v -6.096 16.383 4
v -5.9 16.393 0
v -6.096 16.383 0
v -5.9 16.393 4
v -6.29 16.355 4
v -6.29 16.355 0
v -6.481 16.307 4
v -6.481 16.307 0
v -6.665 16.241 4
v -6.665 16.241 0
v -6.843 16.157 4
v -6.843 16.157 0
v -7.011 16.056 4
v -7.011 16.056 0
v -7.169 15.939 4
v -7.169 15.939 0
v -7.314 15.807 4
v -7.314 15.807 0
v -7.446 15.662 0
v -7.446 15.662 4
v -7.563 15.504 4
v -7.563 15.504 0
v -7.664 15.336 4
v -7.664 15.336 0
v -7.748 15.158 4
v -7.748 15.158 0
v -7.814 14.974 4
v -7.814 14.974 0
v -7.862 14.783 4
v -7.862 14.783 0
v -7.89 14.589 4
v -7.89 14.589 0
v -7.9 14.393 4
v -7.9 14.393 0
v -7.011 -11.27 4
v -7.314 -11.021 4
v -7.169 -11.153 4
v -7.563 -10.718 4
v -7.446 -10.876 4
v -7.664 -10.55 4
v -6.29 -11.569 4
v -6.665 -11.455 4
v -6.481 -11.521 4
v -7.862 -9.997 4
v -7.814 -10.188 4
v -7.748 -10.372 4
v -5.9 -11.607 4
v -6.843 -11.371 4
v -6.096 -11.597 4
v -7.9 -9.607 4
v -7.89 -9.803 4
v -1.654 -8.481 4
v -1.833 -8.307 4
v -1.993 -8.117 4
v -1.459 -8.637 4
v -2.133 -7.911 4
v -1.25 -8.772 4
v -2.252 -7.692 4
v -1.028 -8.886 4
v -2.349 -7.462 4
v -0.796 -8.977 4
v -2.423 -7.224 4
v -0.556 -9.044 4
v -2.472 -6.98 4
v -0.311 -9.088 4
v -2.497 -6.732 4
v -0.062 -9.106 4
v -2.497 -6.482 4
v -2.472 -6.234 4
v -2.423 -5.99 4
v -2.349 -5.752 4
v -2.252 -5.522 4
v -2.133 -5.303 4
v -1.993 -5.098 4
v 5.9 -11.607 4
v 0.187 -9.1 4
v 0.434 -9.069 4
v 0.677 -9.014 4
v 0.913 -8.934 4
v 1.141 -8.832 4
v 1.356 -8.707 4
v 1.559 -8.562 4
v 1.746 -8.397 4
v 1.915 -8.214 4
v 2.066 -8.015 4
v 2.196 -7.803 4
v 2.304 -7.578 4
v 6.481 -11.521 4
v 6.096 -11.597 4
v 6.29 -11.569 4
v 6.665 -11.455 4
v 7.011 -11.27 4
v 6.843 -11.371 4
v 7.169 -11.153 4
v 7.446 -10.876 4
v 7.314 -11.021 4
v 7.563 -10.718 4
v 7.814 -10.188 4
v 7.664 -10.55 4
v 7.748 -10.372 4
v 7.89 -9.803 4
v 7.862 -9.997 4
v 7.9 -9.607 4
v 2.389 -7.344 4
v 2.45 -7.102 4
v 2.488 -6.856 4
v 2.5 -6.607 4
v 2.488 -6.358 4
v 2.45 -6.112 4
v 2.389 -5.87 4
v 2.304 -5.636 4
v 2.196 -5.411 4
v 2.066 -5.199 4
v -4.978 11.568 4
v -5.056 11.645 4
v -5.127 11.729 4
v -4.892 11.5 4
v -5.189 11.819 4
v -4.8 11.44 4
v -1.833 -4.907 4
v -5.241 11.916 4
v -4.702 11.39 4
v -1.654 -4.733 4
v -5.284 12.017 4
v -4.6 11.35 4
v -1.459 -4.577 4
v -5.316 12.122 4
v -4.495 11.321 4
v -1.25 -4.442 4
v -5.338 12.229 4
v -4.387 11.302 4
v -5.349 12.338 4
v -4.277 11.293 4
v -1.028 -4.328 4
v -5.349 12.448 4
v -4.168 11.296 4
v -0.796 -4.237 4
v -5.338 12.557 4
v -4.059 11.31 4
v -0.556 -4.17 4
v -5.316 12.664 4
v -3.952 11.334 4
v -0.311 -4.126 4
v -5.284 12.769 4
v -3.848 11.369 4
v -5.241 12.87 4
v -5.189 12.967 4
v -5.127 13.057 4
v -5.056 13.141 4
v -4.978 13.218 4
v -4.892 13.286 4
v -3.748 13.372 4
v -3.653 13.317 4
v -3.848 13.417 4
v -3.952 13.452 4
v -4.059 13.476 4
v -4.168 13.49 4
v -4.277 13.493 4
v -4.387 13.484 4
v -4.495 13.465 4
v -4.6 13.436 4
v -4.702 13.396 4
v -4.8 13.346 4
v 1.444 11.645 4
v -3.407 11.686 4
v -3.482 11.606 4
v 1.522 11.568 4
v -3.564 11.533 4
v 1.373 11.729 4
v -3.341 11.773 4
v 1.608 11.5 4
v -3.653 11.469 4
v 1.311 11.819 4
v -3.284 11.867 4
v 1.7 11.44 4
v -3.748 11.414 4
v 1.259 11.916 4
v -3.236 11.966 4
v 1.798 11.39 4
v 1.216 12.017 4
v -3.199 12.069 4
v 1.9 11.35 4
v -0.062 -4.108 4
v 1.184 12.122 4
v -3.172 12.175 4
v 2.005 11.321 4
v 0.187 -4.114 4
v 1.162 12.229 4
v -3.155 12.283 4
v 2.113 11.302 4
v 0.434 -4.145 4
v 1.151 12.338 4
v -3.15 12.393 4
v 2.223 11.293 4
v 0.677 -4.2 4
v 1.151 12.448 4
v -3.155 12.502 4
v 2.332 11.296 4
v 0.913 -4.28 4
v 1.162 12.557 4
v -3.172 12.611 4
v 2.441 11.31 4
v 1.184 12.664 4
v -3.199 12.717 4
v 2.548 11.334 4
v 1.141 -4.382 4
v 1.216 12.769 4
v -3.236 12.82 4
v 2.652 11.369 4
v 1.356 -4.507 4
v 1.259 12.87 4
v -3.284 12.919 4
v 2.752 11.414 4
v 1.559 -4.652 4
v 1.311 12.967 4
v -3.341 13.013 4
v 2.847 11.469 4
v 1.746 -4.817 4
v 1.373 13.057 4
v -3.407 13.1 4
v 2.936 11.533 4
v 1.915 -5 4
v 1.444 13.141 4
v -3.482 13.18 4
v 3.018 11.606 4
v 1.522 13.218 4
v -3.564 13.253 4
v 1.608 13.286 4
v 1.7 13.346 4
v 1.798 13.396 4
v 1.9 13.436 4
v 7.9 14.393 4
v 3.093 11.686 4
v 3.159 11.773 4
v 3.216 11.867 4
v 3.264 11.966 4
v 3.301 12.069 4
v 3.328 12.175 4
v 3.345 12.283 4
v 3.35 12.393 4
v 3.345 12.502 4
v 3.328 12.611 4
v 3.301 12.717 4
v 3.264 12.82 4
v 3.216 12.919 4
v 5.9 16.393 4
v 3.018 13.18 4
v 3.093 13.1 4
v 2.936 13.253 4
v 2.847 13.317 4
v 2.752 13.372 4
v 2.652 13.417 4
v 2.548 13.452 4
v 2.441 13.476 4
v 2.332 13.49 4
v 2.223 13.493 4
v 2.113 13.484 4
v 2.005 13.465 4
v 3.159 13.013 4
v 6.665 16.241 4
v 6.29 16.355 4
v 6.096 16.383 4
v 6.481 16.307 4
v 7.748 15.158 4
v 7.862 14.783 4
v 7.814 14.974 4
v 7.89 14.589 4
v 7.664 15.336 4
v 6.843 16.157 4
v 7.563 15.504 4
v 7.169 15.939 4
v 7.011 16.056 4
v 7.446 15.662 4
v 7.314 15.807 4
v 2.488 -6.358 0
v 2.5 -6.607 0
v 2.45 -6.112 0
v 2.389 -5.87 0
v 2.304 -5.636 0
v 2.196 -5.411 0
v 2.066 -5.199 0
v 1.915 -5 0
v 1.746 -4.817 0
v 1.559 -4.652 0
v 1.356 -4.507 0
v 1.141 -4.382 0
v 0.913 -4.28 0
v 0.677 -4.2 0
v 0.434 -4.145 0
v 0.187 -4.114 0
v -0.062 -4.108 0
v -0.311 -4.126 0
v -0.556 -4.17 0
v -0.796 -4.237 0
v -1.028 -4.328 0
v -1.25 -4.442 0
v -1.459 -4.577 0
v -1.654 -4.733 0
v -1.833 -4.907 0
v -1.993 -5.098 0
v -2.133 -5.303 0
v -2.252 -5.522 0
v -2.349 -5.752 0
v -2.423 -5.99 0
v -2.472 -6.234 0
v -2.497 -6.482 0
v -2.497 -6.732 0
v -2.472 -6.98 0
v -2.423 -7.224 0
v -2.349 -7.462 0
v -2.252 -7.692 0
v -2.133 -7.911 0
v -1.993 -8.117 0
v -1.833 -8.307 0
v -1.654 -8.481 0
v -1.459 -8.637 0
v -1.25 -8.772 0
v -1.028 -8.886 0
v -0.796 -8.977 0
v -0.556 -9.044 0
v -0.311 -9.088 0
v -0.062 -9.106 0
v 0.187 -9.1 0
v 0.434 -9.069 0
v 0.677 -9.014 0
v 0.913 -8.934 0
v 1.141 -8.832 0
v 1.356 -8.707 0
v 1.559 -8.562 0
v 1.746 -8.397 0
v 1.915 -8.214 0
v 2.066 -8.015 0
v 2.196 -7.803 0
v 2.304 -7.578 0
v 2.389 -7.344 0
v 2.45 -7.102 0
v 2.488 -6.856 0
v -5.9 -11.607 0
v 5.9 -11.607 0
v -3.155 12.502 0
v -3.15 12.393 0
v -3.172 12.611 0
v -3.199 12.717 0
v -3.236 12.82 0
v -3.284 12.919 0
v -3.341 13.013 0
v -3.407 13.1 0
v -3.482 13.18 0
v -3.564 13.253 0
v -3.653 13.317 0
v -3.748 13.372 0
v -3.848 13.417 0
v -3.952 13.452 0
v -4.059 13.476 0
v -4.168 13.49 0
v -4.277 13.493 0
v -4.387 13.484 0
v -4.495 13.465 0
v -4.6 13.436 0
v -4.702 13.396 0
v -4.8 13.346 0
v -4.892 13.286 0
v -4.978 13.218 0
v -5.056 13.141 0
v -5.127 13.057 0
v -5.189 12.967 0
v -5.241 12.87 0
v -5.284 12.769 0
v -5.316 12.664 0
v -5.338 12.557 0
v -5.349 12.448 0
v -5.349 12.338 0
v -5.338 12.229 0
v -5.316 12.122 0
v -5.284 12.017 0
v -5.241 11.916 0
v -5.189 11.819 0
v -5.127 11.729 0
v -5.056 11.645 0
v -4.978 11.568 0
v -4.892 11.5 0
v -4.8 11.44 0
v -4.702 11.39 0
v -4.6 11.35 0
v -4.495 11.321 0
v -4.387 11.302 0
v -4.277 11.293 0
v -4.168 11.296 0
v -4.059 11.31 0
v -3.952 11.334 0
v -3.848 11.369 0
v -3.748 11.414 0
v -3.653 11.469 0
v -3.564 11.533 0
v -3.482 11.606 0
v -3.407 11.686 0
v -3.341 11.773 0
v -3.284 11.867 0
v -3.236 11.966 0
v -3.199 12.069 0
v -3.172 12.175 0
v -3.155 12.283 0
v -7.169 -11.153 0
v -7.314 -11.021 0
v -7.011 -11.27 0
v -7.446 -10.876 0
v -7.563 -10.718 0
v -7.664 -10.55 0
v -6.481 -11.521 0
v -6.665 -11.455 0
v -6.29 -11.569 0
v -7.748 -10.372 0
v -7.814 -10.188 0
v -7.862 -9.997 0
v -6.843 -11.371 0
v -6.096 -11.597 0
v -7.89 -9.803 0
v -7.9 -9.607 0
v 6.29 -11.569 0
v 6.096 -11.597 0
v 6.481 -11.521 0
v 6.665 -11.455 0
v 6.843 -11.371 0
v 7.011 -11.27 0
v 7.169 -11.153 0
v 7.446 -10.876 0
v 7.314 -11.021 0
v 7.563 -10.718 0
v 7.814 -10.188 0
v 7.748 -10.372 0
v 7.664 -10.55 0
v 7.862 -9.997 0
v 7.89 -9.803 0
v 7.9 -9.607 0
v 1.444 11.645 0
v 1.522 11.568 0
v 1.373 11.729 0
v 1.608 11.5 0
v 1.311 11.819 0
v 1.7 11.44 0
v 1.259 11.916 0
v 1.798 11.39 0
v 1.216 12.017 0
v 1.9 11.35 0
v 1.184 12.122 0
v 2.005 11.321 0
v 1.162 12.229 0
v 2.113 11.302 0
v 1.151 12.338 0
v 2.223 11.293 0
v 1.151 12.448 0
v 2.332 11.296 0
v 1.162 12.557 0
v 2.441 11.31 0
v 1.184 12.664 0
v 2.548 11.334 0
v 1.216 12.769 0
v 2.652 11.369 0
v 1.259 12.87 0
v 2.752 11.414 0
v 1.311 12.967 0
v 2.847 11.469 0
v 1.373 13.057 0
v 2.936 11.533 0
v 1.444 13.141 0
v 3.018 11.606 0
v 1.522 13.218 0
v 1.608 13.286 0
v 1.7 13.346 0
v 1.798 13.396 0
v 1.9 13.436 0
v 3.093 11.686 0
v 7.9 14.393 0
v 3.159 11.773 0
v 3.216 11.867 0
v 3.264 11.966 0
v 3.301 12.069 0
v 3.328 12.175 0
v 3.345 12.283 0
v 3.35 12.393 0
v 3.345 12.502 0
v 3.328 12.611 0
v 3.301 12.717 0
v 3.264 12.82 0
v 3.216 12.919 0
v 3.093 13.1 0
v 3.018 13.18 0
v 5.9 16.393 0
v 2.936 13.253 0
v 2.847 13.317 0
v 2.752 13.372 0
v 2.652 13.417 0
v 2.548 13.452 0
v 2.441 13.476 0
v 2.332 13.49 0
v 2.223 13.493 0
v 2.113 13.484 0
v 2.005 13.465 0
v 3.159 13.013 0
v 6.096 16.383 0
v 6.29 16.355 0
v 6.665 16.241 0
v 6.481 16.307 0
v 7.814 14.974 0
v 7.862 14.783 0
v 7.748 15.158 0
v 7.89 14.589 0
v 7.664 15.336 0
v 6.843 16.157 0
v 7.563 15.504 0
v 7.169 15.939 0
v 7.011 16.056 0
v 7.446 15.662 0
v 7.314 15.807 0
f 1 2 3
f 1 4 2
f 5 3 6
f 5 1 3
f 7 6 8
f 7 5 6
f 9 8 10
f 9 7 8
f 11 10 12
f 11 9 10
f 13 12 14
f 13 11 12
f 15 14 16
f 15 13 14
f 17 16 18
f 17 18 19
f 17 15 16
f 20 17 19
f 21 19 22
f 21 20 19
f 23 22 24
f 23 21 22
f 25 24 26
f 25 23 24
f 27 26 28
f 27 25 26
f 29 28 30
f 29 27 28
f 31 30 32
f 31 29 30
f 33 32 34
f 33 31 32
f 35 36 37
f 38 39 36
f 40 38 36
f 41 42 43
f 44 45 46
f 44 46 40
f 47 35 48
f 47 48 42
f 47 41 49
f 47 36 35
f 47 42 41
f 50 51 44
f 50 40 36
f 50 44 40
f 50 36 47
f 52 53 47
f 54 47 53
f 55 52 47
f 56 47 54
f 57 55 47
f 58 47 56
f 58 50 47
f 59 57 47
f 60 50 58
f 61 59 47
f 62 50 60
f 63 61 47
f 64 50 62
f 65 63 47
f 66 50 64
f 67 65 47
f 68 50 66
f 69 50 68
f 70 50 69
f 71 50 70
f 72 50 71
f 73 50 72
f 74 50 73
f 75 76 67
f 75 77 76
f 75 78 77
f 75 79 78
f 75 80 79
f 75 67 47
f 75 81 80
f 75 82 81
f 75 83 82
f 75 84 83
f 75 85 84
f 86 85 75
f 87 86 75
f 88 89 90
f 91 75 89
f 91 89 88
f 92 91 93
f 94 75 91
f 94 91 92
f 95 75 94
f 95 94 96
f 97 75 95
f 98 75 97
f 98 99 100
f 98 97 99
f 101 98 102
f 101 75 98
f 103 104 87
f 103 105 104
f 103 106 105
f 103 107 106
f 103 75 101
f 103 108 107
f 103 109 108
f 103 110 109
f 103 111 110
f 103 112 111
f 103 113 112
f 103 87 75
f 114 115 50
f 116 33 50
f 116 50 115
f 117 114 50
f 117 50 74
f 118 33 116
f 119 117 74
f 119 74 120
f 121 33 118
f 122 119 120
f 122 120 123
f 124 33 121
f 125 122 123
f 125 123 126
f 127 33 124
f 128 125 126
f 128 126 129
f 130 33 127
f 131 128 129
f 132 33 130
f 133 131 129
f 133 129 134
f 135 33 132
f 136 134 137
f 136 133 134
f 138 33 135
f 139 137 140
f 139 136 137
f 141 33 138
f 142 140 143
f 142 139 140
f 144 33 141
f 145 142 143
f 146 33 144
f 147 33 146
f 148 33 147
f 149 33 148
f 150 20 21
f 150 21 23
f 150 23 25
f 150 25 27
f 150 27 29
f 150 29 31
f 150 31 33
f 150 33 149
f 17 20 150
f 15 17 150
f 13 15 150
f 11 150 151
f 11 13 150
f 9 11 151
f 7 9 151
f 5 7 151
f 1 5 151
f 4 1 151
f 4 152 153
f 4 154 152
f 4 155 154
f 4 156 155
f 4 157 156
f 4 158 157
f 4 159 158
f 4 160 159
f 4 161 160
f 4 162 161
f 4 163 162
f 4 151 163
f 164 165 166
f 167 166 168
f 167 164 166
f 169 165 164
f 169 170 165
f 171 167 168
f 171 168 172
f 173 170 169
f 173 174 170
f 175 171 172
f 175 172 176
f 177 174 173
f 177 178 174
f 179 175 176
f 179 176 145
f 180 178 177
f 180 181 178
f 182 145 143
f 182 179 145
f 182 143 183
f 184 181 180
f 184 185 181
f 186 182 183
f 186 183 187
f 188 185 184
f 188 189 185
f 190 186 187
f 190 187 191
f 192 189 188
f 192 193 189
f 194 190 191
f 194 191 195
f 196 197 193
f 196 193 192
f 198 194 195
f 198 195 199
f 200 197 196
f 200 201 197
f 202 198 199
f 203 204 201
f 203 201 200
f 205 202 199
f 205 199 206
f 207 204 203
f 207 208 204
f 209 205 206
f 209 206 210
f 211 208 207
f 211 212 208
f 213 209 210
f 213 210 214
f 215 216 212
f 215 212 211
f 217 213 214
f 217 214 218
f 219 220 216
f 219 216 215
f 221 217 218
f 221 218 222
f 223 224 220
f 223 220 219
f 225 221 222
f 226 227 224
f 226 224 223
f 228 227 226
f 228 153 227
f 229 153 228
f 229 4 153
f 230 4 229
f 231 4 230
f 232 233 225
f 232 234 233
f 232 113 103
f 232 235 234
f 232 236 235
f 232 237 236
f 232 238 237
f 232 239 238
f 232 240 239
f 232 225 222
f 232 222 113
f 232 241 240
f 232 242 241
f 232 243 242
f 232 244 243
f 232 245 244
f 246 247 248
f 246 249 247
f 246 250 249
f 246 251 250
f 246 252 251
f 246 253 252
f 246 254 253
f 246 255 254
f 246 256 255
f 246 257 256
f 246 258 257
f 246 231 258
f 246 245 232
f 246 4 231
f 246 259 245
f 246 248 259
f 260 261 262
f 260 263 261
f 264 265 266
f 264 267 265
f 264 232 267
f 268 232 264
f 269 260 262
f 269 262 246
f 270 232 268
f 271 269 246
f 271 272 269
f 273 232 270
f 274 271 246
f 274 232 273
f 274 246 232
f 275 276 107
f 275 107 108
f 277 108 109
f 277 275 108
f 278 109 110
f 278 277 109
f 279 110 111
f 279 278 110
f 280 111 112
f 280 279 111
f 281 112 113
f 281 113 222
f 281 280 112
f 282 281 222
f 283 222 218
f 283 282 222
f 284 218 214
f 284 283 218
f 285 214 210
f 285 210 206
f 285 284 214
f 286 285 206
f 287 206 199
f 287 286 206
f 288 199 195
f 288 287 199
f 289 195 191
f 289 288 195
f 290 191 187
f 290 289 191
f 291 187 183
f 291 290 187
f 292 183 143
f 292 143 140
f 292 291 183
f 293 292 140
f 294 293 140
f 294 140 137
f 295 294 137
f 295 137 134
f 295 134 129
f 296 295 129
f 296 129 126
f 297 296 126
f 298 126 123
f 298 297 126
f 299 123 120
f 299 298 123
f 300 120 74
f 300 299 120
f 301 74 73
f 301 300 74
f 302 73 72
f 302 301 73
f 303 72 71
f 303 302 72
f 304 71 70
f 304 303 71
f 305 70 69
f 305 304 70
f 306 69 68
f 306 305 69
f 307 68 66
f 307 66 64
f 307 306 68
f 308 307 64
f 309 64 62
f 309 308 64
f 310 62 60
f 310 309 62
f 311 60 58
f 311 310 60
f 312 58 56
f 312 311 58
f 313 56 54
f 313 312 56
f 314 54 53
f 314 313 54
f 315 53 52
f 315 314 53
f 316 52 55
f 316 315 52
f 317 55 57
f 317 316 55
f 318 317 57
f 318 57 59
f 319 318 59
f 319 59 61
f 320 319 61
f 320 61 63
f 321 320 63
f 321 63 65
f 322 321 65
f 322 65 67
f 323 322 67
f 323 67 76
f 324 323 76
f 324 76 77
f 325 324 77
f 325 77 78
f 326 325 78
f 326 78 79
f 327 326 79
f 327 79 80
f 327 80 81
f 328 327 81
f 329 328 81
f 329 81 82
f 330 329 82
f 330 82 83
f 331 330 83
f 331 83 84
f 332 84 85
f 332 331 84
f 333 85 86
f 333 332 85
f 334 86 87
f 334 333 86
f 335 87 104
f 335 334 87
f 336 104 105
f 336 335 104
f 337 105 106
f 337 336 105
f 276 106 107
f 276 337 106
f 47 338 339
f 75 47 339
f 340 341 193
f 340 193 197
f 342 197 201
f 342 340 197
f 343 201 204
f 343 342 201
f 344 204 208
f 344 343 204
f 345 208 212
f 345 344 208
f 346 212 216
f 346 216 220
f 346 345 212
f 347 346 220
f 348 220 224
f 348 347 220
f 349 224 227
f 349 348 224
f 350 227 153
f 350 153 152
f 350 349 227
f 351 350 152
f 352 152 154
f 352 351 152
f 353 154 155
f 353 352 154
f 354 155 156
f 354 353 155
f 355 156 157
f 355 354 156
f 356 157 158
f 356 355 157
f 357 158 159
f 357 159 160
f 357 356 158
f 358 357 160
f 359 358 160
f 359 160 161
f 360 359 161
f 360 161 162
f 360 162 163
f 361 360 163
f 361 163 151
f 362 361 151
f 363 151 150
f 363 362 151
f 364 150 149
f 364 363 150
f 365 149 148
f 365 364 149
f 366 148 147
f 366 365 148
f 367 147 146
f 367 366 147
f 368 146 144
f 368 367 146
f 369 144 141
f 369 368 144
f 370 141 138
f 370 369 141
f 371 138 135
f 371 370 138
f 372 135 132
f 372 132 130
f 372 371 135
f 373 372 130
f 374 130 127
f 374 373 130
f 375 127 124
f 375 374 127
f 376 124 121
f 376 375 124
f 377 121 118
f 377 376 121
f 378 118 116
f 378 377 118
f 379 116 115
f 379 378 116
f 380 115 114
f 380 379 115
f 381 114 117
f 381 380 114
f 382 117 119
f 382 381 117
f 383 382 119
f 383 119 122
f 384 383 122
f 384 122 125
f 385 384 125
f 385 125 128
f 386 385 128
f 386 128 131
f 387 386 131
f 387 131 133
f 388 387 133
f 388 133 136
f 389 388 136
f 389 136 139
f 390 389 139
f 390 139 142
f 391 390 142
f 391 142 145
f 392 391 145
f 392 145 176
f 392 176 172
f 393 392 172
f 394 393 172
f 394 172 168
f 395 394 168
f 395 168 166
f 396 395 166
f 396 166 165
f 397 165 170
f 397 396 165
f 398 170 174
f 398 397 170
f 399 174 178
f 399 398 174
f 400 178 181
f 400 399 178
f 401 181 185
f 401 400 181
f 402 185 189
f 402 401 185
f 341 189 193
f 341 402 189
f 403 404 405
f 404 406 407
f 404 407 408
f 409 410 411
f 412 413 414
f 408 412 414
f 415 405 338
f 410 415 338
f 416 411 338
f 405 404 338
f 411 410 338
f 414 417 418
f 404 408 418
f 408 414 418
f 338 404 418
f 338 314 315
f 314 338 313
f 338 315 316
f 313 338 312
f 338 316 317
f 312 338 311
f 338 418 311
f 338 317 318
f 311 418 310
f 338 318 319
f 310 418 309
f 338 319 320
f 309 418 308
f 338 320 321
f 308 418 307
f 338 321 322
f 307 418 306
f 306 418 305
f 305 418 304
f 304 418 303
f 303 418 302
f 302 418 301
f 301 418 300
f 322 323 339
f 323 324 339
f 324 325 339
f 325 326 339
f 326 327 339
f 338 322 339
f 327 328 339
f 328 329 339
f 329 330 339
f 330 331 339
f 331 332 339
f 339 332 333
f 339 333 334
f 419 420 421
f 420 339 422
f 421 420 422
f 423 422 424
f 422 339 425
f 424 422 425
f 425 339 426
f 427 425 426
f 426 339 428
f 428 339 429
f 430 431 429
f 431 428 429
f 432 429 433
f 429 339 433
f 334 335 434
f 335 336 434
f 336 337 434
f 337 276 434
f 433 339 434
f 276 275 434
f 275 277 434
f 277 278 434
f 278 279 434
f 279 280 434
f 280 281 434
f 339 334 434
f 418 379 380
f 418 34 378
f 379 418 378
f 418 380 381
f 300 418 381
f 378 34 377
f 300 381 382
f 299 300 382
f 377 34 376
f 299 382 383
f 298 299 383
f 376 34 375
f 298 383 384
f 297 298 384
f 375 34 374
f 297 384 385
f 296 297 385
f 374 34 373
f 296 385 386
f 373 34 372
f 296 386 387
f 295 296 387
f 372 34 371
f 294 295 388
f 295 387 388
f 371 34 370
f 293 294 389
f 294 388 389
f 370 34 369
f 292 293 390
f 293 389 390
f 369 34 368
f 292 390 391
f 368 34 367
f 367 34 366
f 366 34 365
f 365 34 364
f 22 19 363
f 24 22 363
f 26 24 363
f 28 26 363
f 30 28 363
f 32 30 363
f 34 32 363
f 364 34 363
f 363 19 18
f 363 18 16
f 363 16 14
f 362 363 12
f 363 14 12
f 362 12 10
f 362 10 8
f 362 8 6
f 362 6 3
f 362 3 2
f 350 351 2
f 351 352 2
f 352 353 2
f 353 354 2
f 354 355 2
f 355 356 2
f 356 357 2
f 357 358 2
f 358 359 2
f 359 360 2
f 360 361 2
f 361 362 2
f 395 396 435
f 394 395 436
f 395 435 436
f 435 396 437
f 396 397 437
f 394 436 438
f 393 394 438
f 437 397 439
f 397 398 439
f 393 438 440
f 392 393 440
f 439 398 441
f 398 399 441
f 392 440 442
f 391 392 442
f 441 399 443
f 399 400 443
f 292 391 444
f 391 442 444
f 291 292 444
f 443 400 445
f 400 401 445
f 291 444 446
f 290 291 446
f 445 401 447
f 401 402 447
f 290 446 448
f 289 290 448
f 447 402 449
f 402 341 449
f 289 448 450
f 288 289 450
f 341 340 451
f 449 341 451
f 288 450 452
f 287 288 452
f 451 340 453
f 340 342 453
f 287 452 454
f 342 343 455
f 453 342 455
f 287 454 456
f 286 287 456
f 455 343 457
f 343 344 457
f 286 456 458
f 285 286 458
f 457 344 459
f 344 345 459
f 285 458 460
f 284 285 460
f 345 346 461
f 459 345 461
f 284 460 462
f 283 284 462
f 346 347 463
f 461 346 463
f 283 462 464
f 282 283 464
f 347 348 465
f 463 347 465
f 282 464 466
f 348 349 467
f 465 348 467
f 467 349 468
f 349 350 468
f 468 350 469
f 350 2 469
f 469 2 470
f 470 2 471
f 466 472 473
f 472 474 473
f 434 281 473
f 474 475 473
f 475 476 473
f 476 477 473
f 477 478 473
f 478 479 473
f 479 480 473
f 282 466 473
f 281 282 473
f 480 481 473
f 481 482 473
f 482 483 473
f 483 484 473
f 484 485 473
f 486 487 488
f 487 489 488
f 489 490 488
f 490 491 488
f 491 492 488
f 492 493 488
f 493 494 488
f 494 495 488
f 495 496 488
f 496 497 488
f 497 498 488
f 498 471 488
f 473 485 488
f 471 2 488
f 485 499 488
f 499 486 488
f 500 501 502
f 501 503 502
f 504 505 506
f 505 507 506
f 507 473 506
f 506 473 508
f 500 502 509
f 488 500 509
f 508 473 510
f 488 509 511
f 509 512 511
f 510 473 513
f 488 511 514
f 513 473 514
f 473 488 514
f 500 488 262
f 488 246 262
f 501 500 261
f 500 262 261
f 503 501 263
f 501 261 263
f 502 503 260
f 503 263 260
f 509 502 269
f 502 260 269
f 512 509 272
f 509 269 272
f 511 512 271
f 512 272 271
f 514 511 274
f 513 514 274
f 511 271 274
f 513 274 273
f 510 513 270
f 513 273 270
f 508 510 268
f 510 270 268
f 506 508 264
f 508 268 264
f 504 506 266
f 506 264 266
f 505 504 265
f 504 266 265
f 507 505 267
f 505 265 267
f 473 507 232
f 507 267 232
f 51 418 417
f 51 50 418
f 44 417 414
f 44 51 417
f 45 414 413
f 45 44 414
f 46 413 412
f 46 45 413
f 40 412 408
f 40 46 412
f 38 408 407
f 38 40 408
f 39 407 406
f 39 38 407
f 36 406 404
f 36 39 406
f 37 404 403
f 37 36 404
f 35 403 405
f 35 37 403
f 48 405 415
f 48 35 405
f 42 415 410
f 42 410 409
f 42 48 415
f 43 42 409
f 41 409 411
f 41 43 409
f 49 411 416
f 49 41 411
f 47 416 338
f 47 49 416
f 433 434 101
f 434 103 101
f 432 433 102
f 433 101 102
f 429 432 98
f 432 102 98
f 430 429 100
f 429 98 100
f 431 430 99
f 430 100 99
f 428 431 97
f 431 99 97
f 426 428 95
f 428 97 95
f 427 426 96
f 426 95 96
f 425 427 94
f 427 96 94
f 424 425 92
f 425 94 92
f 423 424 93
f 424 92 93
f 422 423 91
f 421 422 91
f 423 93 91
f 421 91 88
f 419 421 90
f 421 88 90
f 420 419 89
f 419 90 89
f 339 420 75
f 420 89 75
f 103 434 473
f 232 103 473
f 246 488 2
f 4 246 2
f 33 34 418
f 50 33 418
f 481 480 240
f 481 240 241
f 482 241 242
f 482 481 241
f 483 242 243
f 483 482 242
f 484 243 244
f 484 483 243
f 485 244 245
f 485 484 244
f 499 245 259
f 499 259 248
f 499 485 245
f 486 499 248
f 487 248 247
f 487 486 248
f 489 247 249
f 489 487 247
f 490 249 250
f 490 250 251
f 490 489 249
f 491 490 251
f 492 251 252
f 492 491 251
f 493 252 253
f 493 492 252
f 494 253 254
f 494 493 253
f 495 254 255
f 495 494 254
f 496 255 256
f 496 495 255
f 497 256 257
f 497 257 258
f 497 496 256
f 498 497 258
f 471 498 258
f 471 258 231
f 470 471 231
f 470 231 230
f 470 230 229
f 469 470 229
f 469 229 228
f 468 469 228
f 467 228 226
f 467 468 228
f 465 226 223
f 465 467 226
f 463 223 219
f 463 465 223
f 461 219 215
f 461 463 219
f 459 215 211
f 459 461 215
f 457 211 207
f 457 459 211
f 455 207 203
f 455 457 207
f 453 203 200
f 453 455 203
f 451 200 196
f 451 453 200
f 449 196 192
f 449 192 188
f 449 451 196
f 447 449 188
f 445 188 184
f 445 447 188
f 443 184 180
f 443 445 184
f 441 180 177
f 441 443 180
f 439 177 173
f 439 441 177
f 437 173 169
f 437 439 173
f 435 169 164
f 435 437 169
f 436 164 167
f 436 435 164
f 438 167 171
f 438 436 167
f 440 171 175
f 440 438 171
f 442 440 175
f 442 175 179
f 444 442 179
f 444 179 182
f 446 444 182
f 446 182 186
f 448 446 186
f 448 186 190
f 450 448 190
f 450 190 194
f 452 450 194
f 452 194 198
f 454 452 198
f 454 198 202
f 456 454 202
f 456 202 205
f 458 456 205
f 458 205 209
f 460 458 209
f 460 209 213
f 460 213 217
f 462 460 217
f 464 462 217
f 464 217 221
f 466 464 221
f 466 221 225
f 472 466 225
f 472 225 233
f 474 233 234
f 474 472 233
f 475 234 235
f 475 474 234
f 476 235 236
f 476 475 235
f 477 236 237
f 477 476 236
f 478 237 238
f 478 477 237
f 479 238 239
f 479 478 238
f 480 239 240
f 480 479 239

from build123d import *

# Parameters (mm, degrees)
F0_R     = 2.5
F0_R_2   = 1.1
F1_DEPTH = 4
F2_R     = 2


with BuildPart() as f1:
    # F0 (on Top) → F1 (new body)
    with BuildSketch(Plane.XY):
        Polygon((7.9, 16.392971), (0, 16.392971), (-7.9, 16.392971), (-7.9, -11.607029), (0, -11.607029), (7.9, -11.607029), align=None)
        with Locations((0, -6.607029)):
            Circle(F0_R, mode=Mode.SUBTRACT)
        with Locations((-4.25, 12.392971)):
            Circle(F0_R_2, mode=Mode.SUBTRACT)
        with Locations((2.25, 12.392971)):
            Circle(F0_R_2, mode=Mode.SUBTRACT)
    extrude(amount=F1_DEPTH)

    # F2
    f2_edges = [f1.edges().sort_by_distance(p)[0] for p in [
        (7.9, -11.607029, 2),
        (7.9, 16.392971, 2),
        (-7.9, -11.607029, 2),
        (-7.9, 16.392971, 2),
    ]]
    fillet(f2_edges, radius=F2_R)


solid = f1.part
